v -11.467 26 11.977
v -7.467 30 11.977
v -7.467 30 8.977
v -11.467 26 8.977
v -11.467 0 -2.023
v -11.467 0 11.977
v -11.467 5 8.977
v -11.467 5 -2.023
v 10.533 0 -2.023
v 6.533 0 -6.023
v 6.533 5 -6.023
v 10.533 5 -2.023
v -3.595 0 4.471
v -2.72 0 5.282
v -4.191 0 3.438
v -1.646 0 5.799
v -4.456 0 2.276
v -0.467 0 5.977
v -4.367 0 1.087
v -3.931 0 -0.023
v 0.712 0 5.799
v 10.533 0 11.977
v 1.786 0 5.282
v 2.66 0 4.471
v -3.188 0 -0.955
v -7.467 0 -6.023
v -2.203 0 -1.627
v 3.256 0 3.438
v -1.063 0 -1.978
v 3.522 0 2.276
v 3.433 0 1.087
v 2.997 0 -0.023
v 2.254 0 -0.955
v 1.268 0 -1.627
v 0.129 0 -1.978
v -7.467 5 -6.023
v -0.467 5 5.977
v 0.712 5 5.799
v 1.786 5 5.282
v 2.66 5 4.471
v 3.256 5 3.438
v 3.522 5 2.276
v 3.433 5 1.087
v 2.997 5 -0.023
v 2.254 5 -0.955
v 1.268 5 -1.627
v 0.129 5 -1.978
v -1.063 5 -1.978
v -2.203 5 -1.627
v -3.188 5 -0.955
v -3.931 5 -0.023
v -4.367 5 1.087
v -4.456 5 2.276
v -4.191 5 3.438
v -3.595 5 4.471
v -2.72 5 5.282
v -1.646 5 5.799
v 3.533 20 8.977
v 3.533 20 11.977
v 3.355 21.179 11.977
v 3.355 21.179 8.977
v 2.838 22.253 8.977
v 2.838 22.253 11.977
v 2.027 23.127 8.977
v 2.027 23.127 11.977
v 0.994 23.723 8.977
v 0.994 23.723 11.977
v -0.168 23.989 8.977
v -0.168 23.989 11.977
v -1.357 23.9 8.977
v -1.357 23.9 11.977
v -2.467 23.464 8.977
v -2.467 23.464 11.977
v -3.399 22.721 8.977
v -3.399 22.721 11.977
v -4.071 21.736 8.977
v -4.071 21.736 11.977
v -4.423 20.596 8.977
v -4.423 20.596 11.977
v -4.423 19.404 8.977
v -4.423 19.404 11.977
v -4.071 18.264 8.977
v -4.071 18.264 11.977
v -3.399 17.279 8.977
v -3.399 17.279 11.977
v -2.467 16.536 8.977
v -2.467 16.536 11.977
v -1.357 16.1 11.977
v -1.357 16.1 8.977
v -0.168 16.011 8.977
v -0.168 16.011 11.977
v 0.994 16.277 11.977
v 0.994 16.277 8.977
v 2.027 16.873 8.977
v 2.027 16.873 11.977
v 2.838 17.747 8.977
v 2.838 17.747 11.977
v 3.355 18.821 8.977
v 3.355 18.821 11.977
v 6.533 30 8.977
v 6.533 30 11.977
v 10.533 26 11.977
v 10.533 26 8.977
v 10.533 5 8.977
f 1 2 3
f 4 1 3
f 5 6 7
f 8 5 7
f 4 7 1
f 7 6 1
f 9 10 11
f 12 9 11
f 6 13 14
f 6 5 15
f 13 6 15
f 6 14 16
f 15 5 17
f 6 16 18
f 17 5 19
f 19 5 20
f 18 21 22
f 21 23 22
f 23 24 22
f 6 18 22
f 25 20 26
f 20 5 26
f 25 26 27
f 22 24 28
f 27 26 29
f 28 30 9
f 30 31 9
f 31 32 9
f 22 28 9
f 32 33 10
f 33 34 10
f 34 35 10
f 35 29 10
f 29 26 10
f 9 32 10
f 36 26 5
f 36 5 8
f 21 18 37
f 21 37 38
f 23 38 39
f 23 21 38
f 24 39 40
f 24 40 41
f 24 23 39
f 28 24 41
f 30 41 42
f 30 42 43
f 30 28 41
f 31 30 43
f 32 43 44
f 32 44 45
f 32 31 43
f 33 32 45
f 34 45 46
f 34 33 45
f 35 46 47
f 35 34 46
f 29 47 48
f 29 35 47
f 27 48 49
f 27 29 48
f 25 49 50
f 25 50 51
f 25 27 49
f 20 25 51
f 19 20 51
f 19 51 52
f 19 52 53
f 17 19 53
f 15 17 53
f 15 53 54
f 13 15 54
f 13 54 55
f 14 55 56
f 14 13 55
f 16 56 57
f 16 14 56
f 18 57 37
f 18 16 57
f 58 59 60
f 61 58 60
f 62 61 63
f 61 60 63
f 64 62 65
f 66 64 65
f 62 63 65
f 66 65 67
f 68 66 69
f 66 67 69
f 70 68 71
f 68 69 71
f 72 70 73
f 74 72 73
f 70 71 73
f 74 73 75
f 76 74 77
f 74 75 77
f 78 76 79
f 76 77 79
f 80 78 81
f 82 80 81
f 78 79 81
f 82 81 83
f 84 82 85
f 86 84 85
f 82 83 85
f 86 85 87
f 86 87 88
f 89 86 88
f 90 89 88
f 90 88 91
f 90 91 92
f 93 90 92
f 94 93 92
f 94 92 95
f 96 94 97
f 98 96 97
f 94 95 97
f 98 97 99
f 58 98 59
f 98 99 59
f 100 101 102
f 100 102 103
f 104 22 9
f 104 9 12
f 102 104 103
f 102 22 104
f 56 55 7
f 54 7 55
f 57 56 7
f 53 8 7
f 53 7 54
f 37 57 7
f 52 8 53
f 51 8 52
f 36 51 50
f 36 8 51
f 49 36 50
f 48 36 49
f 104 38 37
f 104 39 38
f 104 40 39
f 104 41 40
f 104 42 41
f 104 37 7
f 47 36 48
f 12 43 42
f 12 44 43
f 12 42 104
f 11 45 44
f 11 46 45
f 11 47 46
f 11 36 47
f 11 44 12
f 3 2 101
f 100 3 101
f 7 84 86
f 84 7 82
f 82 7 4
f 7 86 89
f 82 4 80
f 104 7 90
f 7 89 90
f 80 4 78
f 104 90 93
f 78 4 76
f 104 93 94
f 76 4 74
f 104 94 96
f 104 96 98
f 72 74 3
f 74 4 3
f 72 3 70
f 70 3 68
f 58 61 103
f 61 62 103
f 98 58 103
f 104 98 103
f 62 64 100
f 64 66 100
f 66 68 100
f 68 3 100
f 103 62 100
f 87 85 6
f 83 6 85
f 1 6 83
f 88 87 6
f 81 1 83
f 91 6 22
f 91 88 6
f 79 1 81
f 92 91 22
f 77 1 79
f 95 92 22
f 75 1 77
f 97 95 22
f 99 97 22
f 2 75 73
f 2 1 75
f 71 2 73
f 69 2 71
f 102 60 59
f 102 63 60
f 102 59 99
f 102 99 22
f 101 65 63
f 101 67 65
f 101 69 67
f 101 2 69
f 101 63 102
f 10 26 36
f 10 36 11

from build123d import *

# Parameters (mm, degrees)
SKETCH_1_W      = 22
SKETCH_1_H      = 18
SKETCH_1_R      = 4
EXTRUDE_1_DEPTH = 5
SKETCH_2_W      = 22
SKETCH_2_H      = 25
SKETCH_2_R      = 4
EXTRUDE_2_DEPTH = 3
CHAMFER_1_SIZE  = 4


with BuildPart() as part:
    # 草图1 → 凸台-拉伸1 (new body)
    with BuildSketch(Plane(origin=(0, 0, 0), x_dir=(1, 0, 0), z_dir=(0, 1, 0))):
        with Locations((-0.467181467, -2.976833977)):
            Rectangle(SKETCH_1_W, SKETCH_1_H)
        with Locations(Location((-0.467181467, -1.976833977, 0), (0, 0, 270))):
            Circle(SKETCH_1_R, mode=Mode.SUBTRACT)
    extrude(amount=EXTRUDE_1_DEPTH)

    # 草图2 → 凸台-拉伸2 (add)
    with BuildSketch(Plane.XY.offset(11.976833977)):
        with Locations((-0.467181467, 17.5)):
            Rectangle(SKETCH_2_W, SKETCH_2_H)
        with Locations((-0.467181467, 20)):
            Circle(SKETCH_2_R, mode=Mode.SUBTRACT)
    extrude(amount=-EXTRUDE_2_DEPTH)

    # 倒角1
    chamfer_1_edges = [part.edges().sort_by_distance(p)[0] for p in [
        (-11.467181467, 30, 10.476833977),
        (10.532818533, 30, 10.476833977),
        (-11.467181467, 2.5, -6.023166023),
        (10.532818533, 2.5, -6.023166023),
    ]]
    chamfer(chamfer_1_edges, length=CHAMFER_1_SIZE)


solid = part.part
